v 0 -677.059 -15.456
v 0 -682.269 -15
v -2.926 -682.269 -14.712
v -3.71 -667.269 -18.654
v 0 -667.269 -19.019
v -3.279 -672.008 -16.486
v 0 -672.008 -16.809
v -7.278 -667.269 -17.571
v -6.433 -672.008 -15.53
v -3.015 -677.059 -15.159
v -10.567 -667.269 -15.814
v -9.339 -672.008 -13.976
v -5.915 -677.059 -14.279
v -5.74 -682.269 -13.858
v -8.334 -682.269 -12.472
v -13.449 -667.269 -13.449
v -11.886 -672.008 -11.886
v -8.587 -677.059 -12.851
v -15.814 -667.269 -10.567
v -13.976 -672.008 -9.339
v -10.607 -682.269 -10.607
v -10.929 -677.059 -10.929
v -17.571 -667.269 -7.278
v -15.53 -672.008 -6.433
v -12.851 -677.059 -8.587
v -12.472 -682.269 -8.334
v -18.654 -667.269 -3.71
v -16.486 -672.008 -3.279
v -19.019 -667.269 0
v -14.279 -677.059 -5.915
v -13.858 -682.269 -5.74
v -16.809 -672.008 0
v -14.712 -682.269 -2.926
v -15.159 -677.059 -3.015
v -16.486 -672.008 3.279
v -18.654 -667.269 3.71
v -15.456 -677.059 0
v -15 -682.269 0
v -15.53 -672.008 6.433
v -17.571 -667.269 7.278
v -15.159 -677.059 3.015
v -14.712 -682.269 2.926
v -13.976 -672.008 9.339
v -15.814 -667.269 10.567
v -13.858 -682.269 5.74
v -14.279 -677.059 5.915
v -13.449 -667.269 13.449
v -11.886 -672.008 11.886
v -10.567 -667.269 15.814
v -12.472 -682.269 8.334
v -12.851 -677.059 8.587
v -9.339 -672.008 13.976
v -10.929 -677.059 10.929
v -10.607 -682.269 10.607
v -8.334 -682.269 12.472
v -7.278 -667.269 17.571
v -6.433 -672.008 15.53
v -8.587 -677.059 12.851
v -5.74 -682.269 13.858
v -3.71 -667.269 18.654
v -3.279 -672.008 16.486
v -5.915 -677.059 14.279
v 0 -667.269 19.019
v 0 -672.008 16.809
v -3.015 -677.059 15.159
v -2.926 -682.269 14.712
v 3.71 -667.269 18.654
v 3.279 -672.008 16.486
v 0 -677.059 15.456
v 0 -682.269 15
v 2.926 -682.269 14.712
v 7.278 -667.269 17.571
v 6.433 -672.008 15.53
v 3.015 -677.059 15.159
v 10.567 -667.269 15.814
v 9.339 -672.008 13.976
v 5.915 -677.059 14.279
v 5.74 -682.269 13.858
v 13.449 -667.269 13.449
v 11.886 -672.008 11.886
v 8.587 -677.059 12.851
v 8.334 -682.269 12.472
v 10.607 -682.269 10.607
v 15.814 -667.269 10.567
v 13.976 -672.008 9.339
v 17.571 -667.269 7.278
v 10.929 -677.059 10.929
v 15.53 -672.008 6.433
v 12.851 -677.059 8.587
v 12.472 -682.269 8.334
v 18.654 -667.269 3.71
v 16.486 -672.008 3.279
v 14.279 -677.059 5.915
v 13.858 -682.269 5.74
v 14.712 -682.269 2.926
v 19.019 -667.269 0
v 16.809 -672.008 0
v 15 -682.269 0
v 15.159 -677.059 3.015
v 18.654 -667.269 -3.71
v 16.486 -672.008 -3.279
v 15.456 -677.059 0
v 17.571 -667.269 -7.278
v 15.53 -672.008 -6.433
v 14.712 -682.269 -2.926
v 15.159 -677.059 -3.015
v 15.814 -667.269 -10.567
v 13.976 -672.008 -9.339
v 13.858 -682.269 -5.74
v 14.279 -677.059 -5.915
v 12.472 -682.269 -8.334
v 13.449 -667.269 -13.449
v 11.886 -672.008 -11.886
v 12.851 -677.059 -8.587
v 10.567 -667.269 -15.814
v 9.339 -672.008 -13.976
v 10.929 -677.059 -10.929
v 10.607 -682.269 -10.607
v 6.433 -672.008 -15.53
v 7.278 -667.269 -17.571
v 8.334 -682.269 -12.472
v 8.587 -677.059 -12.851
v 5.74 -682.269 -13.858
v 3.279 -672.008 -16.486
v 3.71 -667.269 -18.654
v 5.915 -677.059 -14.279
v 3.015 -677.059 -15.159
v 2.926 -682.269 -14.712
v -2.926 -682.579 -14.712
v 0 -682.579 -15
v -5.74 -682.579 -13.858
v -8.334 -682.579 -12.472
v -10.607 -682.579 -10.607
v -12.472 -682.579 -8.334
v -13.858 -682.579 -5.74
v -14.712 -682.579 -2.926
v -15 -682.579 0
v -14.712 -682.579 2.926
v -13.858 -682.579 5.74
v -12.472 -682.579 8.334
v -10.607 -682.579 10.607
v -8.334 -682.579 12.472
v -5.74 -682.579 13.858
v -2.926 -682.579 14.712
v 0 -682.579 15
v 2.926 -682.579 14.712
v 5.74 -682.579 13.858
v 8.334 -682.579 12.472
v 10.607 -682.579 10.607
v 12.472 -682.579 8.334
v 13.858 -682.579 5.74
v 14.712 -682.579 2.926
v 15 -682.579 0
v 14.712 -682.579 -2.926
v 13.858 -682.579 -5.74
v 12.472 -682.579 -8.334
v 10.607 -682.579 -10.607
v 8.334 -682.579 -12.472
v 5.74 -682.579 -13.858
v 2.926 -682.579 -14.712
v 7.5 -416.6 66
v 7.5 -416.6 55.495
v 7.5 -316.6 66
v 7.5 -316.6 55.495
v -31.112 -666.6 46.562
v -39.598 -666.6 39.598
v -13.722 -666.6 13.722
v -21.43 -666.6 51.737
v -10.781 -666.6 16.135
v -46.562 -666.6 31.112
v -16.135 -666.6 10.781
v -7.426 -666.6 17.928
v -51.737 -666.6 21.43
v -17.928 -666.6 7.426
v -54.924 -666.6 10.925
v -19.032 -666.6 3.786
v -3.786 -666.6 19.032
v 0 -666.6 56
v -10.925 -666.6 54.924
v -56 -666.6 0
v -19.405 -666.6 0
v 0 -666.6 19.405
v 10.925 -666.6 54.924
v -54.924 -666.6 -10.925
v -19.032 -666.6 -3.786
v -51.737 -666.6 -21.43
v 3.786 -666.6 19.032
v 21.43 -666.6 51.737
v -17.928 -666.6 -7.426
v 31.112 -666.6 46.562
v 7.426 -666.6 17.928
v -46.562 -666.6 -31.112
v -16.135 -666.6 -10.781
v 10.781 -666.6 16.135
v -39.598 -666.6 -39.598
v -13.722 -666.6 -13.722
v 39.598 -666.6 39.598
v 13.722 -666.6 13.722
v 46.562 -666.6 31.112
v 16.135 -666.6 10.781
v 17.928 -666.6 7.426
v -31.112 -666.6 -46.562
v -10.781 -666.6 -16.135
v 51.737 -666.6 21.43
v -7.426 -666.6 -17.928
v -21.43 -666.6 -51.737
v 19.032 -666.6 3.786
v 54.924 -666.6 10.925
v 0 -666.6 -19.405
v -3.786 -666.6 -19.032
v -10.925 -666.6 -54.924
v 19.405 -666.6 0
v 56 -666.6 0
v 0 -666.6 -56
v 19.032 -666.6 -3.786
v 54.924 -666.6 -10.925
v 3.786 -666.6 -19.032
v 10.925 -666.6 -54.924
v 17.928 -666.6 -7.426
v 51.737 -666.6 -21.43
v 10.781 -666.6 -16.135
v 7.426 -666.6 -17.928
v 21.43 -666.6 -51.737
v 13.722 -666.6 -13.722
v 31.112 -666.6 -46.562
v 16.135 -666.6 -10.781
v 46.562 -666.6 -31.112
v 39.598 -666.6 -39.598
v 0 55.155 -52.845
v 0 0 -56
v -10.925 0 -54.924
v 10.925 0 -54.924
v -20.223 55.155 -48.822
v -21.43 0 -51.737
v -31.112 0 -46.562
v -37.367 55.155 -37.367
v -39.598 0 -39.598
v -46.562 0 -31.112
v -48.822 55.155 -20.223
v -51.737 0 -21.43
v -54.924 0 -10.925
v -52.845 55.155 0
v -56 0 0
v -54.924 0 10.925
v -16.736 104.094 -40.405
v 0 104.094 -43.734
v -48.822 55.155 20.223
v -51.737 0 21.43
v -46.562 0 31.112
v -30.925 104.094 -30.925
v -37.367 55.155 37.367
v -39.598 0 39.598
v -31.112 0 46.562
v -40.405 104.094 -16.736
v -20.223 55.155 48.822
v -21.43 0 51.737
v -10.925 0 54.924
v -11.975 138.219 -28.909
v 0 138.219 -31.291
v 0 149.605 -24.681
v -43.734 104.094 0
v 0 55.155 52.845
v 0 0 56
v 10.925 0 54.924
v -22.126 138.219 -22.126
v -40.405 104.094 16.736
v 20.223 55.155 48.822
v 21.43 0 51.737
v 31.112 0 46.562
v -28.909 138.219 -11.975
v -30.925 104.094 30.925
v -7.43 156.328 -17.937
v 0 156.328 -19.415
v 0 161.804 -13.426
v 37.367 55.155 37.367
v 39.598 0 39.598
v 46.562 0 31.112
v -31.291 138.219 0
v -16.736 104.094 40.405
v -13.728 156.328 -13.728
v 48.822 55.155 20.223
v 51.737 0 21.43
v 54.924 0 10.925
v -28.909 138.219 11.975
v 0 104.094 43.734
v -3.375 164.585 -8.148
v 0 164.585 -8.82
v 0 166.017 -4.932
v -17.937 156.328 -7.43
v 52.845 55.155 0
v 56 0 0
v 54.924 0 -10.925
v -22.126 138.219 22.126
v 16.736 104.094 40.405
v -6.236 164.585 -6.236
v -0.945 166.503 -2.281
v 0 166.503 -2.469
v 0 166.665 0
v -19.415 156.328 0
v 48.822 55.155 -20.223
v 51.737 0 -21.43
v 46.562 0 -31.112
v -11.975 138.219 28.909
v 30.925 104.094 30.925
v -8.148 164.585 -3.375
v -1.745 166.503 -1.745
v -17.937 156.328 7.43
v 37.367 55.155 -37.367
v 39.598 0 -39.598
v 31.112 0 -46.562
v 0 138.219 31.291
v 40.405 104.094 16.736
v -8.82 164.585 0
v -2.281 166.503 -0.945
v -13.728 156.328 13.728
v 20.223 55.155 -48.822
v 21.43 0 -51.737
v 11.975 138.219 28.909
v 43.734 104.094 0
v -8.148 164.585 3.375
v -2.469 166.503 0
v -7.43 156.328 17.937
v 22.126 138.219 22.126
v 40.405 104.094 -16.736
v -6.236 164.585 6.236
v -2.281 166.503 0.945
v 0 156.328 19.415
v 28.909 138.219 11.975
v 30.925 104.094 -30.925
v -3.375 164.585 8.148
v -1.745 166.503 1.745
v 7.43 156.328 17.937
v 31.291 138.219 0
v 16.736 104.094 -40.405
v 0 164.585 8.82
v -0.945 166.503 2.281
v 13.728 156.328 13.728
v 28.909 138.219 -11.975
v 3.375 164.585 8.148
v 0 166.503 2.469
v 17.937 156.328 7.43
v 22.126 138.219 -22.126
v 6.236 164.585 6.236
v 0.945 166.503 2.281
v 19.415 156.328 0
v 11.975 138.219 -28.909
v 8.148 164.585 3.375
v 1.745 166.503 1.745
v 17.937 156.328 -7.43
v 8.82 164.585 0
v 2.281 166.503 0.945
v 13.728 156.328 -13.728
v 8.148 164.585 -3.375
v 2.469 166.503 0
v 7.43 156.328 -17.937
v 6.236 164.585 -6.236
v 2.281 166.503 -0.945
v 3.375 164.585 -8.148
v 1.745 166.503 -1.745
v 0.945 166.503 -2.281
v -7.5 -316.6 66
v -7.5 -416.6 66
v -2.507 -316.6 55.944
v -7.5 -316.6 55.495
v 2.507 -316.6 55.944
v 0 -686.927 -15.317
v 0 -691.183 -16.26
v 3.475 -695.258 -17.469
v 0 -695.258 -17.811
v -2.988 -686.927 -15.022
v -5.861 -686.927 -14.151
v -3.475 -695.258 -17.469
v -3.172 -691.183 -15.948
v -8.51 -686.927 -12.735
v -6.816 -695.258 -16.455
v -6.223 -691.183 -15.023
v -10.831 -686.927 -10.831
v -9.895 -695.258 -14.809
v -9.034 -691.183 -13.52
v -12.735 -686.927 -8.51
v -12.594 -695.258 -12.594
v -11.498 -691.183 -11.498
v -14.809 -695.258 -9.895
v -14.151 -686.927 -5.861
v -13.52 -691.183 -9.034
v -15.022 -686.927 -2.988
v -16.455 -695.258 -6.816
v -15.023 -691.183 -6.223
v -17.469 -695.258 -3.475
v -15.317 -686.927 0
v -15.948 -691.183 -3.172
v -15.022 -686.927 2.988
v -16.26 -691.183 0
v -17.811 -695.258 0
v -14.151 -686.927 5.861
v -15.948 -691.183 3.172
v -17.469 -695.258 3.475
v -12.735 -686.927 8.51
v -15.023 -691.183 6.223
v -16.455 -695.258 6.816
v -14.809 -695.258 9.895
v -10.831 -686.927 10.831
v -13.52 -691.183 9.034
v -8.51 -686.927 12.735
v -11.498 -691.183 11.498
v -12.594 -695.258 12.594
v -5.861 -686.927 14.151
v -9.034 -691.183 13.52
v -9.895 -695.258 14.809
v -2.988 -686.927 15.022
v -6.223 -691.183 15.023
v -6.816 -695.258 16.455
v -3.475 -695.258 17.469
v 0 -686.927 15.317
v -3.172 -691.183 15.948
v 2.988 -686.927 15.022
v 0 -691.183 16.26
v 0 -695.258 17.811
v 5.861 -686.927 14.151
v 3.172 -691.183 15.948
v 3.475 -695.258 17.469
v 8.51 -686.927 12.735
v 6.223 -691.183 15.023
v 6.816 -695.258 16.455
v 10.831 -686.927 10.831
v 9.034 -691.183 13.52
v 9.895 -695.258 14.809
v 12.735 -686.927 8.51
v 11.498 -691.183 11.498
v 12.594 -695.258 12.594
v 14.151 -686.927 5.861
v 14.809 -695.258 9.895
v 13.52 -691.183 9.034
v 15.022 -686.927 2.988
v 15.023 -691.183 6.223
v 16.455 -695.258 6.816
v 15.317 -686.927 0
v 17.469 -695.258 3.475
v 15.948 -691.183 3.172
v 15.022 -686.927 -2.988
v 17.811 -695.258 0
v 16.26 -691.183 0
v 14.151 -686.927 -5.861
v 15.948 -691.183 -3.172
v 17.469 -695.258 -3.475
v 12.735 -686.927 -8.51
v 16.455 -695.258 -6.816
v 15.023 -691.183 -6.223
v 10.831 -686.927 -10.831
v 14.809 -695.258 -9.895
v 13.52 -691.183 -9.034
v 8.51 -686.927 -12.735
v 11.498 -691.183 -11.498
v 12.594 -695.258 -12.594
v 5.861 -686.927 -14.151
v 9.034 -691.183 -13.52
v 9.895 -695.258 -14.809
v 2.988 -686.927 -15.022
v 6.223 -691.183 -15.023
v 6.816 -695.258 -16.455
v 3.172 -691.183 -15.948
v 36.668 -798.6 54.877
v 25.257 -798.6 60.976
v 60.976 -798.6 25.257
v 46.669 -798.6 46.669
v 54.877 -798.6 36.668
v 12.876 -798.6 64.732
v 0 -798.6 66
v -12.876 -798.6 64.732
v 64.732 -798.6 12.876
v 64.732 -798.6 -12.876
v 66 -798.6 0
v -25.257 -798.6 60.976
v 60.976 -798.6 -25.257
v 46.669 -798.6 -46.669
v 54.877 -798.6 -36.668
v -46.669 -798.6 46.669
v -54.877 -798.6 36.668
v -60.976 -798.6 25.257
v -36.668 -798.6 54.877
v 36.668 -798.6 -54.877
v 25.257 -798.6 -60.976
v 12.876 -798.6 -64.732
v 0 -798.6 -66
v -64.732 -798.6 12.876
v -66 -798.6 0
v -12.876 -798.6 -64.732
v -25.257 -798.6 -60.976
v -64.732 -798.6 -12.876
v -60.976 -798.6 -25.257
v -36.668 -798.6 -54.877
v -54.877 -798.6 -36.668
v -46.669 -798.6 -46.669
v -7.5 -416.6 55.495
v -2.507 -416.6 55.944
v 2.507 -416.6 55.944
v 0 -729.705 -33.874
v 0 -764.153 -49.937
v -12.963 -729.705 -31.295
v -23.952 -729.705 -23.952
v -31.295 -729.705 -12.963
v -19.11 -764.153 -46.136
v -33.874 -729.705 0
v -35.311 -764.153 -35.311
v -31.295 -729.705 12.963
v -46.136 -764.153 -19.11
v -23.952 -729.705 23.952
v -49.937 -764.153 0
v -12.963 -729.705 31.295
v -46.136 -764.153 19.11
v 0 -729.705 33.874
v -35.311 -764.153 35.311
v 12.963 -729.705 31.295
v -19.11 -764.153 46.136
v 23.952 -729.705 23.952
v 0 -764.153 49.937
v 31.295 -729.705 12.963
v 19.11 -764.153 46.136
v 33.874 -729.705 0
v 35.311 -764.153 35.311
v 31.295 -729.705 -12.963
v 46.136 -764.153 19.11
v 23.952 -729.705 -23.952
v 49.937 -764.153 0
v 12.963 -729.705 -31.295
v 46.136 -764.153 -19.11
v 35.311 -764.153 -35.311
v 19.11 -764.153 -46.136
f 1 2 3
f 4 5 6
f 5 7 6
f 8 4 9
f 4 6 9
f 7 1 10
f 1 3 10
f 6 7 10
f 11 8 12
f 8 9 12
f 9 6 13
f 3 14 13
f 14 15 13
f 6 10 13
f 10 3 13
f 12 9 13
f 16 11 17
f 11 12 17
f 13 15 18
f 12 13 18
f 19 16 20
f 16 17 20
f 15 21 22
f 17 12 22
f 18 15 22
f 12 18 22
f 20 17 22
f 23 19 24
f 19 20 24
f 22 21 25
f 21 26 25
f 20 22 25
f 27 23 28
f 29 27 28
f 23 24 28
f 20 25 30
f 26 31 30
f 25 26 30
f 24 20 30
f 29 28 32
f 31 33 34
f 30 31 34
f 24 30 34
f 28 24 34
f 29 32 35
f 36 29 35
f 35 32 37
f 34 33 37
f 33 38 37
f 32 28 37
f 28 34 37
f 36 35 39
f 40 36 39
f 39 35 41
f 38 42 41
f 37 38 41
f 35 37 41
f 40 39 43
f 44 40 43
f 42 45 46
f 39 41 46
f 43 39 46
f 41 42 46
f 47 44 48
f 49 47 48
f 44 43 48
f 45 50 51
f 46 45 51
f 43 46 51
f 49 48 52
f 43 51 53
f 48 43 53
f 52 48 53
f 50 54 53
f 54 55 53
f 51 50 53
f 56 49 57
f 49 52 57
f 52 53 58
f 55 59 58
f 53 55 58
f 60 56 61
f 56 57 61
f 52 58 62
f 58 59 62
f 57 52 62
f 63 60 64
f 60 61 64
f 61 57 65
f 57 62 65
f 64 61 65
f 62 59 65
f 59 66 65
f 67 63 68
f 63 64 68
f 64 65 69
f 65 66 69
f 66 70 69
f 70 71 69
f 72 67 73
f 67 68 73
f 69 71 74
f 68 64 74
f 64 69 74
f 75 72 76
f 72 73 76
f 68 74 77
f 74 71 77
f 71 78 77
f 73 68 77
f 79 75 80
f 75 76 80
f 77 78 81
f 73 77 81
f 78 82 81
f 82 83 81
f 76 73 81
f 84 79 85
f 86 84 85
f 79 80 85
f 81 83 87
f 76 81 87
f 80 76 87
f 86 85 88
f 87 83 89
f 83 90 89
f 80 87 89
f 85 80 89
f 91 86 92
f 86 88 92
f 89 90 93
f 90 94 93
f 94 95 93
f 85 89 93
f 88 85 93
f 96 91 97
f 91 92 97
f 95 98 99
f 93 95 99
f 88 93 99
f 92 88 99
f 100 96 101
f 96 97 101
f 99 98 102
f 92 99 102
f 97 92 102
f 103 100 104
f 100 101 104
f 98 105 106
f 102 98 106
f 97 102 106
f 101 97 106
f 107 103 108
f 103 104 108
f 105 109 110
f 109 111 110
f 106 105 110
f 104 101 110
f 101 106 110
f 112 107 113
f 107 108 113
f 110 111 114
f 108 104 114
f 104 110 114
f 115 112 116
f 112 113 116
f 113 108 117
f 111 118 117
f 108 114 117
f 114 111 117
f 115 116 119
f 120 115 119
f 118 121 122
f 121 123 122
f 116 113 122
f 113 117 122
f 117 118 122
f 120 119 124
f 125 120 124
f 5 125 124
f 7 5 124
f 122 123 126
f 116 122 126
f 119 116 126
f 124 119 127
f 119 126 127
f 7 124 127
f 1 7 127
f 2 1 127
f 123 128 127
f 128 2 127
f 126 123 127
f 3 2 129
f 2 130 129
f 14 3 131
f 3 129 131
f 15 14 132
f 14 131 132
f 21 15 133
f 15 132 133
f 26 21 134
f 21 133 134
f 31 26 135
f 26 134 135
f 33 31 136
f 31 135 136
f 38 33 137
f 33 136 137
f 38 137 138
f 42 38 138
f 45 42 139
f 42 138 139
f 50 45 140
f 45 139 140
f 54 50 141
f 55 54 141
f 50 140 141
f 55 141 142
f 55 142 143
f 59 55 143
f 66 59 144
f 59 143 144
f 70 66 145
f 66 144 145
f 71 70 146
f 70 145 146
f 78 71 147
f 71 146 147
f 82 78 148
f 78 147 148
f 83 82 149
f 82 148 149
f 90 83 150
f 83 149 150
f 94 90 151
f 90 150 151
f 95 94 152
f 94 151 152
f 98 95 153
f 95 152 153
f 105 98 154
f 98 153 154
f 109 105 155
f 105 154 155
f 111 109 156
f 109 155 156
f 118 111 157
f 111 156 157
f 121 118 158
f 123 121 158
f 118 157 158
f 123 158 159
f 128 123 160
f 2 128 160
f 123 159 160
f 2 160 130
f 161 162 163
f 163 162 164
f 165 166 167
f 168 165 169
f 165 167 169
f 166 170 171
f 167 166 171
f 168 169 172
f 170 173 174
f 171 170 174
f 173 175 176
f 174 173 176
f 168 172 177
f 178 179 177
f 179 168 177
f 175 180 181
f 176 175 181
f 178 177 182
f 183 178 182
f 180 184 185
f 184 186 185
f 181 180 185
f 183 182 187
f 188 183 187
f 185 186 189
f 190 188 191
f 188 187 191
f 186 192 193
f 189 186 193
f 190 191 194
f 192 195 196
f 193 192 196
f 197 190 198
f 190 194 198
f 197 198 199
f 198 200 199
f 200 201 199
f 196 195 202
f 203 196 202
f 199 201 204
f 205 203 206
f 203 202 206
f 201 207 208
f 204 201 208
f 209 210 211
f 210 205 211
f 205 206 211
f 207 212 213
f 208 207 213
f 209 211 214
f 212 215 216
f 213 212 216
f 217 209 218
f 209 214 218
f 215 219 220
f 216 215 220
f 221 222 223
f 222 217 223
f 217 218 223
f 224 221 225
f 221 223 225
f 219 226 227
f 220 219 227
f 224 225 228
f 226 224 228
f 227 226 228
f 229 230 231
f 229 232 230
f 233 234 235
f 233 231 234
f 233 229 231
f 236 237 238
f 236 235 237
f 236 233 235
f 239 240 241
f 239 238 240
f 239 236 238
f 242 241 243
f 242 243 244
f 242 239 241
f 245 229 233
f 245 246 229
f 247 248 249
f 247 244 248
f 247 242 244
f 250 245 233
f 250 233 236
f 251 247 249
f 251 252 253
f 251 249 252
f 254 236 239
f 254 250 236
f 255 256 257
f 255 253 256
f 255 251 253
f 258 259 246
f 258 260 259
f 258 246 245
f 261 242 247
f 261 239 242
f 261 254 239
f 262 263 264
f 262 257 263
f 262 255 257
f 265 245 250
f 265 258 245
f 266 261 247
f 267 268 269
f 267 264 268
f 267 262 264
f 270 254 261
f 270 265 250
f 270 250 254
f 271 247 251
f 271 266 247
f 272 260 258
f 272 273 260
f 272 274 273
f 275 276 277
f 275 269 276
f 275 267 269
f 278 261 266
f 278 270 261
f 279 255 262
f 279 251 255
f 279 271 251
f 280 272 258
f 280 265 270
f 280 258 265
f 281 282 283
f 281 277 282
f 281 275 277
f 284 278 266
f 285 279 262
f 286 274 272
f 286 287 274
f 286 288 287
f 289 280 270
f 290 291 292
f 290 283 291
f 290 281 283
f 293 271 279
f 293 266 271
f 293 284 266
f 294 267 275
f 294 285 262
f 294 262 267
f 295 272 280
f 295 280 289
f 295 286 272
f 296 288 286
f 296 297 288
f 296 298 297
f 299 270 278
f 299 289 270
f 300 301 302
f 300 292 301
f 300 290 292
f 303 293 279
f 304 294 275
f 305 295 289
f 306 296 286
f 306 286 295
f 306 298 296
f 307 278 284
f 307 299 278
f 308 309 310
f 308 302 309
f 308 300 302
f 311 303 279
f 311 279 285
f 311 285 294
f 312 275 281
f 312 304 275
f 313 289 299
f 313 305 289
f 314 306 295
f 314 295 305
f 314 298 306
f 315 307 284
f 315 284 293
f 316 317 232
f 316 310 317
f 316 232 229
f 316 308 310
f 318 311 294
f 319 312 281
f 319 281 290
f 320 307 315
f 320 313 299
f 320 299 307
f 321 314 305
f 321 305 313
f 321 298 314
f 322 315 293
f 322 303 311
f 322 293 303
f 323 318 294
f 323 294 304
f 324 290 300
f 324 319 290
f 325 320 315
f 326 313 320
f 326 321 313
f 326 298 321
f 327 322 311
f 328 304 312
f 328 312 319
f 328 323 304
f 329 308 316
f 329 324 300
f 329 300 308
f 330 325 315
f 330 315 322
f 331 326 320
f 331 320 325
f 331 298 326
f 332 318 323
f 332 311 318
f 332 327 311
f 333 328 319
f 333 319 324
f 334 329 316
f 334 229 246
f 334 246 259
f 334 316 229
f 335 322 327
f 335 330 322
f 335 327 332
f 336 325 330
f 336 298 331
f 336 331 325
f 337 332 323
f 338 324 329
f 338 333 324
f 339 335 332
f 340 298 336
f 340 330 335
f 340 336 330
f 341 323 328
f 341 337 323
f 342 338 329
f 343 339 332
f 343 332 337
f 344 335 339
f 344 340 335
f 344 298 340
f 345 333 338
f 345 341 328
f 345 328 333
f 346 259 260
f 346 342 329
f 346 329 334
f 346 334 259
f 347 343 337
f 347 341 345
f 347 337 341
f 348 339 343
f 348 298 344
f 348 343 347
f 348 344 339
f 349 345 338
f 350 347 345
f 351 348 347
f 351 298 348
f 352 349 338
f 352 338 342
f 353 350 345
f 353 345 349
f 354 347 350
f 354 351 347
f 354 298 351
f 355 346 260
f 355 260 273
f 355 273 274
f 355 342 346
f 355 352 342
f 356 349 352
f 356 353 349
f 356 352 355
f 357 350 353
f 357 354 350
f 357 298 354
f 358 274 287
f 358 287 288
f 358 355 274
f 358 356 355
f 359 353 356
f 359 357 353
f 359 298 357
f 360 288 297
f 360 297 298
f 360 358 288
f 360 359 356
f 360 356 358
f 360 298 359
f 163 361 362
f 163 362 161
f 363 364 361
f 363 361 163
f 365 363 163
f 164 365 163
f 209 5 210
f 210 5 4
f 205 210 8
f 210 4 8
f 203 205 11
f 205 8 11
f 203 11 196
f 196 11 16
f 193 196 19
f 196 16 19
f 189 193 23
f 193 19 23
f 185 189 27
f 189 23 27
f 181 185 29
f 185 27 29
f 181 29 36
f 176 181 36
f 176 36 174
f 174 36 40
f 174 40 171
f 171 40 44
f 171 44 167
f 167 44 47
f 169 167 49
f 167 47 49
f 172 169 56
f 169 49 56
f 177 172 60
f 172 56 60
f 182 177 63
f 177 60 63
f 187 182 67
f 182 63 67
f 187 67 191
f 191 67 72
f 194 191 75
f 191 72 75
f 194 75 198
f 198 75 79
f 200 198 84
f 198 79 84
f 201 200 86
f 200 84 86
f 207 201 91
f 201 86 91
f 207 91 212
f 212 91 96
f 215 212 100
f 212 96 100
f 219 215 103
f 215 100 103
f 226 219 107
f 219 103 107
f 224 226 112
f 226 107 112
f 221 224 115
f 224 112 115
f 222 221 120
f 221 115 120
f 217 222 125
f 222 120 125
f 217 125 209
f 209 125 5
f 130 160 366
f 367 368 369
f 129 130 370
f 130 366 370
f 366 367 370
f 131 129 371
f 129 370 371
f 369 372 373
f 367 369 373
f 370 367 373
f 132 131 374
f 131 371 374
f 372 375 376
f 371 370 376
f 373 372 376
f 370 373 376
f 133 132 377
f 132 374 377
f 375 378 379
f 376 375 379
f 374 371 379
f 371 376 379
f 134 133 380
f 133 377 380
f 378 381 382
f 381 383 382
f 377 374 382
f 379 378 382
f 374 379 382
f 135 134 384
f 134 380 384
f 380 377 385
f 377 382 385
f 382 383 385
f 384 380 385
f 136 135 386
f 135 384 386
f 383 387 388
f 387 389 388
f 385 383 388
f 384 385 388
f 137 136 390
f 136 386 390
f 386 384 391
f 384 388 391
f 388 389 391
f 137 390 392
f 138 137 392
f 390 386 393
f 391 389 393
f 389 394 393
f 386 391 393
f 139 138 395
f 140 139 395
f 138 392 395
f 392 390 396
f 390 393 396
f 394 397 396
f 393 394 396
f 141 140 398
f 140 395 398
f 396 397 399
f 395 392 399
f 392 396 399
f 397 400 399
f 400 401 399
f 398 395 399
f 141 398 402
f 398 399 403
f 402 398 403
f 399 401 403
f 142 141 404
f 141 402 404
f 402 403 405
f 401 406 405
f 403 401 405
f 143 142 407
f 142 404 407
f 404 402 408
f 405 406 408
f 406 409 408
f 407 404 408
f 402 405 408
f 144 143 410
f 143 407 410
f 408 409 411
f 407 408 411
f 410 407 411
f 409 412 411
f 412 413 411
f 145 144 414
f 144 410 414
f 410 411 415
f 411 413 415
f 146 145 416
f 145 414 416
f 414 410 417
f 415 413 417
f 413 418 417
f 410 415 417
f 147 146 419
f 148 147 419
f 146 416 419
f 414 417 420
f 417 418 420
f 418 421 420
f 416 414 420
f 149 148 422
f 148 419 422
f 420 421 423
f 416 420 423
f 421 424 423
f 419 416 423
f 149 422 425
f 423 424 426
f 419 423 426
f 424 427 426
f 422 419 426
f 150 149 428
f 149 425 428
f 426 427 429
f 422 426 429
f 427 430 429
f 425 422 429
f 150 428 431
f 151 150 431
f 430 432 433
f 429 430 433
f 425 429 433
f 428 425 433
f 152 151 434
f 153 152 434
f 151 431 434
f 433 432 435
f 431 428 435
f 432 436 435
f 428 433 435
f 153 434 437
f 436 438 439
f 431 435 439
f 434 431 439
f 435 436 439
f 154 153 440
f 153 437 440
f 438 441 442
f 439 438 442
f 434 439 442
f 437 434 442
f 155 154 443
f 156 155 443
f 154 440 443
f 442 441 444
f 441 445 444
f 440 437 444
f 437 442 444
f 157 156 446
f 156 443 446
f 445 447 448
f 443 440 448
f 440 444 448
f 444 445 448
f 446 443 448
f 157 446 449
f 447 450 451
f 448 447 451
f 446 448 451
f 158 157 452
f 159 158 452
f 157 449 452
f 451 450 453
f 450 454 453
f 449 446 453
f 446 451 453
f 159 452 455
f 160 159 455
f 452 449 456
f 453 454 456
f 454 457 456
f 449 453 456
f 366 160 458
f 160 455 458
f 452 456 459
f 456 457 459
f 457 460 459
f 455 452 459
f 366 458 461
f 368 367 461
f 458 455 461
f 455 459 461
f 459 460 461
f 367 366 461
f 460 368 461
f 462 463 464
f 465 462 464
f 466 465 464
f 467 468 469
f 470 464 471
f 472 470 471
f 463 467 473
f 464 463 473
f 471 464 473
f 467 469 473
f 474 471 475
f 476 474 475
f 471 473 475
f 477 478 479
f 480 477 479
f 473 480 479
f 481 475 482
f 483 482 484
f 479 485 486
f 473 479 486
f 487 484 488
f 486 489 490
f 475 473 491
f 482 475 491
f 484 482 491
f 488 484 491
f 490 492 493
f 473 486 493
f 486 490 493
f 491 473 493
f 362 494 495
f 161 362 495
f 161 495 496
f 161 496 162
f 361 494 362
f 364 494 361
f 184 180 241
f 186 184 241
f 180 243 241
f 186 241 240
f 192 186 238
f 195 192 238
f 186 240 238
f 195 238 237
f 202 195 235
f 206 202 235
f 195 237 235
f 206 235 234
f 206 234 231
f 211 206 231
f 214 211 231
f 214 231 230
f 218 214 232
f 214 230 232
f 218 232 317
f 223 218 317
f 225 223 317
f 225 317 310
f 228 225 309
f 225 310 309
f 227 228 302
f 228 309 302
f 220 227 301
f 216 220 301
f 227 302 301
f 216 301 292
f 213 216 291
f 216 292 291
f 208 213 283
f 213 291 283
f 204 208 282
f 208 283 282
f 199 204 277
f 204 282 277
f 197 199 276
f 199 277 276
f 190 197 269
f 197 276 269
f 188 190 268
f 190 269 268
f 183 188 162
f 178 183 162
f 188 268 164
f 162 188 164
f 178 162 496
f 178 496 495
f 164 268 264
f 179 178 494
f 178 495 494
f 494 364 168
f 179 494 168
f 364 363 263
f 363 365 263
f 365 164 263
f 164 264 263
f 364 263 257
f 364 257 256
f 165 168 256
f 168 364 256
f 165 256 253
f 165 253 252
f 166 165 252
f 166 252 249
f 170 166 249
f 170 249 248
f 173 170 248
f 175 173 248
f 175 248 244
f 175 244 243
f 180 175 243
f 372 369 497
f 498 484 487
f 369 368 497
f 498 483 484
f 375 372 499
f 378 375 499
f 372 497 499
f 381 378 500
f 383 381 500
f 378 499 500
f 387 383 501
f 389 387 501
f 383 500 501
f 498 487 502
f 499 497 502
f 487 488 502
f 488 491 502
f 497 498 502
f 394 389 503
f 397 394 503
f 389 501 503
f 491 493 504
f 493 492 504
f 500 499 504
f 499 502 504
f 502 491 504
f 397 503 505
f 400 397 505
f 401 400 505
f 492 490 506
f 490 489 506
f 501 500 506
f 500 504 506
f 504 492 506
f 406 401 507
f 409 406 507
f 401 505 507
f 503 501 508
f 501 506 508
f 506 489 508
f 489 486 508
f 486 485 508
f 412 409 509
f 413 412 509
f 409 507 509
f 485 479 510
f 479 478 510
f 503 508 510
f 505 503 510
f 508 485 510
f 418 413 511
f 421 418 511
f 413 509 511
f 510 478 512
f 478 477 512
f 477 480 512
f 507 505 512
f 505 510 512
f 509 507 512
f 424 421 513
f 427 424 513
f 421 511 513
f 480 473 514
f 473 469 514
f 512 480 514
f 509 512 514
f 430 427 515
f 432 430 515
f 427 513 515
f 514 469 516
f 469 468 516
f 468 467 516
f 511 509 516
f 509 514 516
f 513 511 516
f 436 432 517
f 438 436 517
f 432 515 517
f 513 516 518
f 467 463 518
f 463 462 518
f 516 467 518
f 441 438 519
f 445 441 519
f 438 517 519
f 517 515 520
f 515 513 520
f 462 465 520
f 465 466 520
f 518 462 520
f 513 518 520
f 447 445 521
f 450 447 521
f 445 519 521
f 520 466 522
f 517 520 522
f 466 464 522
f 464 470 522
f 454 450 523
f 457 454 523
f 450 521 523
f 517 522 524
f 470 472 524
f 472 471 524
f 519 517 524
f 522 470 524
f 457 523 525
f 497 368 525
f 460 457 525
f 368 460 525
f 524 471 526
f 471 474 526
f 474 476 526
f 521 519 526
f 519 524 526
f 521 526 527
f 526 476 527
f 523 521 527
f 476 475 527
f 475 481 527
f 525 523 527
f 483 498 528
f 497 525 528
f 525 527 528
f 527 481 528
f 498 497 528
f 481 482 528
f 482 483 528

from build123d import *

# Parameters (mm, degrees)
SKETCH1_W           = 56
SKETCH1_H           = 666.6
DOME1_FACE_RADIUS   = 56
DOME1_HEIGHT        = 166.665
SKETCH3_W           = 15
SKETCH3_H           = 100
BOSS_EXTRUDE1_DEPTH = 66


with BuildPart() as part:
    # Sketch1 → Revolve1 (revolve)
    with BuildSketch(Plane.XY):
        with Locations((28, -333.3)):
            Rectangle(SKETCH1_W, SKETCH1_H)
    revolve(axis=Axis((0, 0, 0), (0, -1, 0)))

    # Dome1: an elliptical dome of height H over a round flat face of radius A is half a spheroid: the quarter ellipse of half axes A and H revolved about the face's axis
    with BuildSketch(Plane((0, 0, 0), x_dir=(0, 0, -1), z_dir=(1, 0, 0)), mode=Mode.PRIVATE) as dome1_quarter:
        Ellipse(DOME1_FACE_RADIUS, DOME1_HEIGHT)
        Rectangle(DOME1_FACE_RADIUS, DOME1_HEIGHT, align=(Align.MIN, Align.MIN), mode=Mode.INTERSECT)
    revolve(dome1_quarter.sketch, axis=Axis((0, 0, 0), (0, 1, 0)))

    # Sketch2 → Revolve2 (revolve)
    with BuildSketch(Plane.XY):
        with BuildLine():
            Line((19.405267456, -666.6), (19.019237886, -667.268622827))
            ThreePointArc((19.019237886, -667.268622827), (16.022225211, -674.504051474), (15, -682.268622827))
            Line((15, -682.268622827), (15, -682.579307175))
            ThreePointArc((15, -682.579307175), (15.711119786, -689.072495593), (17.810766389, -695.257855027))
            Line((17.810766389, -695.257855027), (66, -798.6))
            Line((66, -798.6), (0, -798.6))
            Line((0, -798.6), (0, -666.6))
            Line((0, -666.6), (19.405267456, -666.6))
        make_face()
    revolve(axis=Axis((0, -1354.267338739, 0), (0, 1, 0)))

    # Sketch3 → Boss-Extrude1 (add)
    with BuildSketch(Plane.XY):
        with Locations((0, -366.6)):
            Rectangle(SKETCH3_W, SKETCH3_H)
    extrude(amount=BOSS_EXTRUDE1_DEPTH)


solid = part.part
